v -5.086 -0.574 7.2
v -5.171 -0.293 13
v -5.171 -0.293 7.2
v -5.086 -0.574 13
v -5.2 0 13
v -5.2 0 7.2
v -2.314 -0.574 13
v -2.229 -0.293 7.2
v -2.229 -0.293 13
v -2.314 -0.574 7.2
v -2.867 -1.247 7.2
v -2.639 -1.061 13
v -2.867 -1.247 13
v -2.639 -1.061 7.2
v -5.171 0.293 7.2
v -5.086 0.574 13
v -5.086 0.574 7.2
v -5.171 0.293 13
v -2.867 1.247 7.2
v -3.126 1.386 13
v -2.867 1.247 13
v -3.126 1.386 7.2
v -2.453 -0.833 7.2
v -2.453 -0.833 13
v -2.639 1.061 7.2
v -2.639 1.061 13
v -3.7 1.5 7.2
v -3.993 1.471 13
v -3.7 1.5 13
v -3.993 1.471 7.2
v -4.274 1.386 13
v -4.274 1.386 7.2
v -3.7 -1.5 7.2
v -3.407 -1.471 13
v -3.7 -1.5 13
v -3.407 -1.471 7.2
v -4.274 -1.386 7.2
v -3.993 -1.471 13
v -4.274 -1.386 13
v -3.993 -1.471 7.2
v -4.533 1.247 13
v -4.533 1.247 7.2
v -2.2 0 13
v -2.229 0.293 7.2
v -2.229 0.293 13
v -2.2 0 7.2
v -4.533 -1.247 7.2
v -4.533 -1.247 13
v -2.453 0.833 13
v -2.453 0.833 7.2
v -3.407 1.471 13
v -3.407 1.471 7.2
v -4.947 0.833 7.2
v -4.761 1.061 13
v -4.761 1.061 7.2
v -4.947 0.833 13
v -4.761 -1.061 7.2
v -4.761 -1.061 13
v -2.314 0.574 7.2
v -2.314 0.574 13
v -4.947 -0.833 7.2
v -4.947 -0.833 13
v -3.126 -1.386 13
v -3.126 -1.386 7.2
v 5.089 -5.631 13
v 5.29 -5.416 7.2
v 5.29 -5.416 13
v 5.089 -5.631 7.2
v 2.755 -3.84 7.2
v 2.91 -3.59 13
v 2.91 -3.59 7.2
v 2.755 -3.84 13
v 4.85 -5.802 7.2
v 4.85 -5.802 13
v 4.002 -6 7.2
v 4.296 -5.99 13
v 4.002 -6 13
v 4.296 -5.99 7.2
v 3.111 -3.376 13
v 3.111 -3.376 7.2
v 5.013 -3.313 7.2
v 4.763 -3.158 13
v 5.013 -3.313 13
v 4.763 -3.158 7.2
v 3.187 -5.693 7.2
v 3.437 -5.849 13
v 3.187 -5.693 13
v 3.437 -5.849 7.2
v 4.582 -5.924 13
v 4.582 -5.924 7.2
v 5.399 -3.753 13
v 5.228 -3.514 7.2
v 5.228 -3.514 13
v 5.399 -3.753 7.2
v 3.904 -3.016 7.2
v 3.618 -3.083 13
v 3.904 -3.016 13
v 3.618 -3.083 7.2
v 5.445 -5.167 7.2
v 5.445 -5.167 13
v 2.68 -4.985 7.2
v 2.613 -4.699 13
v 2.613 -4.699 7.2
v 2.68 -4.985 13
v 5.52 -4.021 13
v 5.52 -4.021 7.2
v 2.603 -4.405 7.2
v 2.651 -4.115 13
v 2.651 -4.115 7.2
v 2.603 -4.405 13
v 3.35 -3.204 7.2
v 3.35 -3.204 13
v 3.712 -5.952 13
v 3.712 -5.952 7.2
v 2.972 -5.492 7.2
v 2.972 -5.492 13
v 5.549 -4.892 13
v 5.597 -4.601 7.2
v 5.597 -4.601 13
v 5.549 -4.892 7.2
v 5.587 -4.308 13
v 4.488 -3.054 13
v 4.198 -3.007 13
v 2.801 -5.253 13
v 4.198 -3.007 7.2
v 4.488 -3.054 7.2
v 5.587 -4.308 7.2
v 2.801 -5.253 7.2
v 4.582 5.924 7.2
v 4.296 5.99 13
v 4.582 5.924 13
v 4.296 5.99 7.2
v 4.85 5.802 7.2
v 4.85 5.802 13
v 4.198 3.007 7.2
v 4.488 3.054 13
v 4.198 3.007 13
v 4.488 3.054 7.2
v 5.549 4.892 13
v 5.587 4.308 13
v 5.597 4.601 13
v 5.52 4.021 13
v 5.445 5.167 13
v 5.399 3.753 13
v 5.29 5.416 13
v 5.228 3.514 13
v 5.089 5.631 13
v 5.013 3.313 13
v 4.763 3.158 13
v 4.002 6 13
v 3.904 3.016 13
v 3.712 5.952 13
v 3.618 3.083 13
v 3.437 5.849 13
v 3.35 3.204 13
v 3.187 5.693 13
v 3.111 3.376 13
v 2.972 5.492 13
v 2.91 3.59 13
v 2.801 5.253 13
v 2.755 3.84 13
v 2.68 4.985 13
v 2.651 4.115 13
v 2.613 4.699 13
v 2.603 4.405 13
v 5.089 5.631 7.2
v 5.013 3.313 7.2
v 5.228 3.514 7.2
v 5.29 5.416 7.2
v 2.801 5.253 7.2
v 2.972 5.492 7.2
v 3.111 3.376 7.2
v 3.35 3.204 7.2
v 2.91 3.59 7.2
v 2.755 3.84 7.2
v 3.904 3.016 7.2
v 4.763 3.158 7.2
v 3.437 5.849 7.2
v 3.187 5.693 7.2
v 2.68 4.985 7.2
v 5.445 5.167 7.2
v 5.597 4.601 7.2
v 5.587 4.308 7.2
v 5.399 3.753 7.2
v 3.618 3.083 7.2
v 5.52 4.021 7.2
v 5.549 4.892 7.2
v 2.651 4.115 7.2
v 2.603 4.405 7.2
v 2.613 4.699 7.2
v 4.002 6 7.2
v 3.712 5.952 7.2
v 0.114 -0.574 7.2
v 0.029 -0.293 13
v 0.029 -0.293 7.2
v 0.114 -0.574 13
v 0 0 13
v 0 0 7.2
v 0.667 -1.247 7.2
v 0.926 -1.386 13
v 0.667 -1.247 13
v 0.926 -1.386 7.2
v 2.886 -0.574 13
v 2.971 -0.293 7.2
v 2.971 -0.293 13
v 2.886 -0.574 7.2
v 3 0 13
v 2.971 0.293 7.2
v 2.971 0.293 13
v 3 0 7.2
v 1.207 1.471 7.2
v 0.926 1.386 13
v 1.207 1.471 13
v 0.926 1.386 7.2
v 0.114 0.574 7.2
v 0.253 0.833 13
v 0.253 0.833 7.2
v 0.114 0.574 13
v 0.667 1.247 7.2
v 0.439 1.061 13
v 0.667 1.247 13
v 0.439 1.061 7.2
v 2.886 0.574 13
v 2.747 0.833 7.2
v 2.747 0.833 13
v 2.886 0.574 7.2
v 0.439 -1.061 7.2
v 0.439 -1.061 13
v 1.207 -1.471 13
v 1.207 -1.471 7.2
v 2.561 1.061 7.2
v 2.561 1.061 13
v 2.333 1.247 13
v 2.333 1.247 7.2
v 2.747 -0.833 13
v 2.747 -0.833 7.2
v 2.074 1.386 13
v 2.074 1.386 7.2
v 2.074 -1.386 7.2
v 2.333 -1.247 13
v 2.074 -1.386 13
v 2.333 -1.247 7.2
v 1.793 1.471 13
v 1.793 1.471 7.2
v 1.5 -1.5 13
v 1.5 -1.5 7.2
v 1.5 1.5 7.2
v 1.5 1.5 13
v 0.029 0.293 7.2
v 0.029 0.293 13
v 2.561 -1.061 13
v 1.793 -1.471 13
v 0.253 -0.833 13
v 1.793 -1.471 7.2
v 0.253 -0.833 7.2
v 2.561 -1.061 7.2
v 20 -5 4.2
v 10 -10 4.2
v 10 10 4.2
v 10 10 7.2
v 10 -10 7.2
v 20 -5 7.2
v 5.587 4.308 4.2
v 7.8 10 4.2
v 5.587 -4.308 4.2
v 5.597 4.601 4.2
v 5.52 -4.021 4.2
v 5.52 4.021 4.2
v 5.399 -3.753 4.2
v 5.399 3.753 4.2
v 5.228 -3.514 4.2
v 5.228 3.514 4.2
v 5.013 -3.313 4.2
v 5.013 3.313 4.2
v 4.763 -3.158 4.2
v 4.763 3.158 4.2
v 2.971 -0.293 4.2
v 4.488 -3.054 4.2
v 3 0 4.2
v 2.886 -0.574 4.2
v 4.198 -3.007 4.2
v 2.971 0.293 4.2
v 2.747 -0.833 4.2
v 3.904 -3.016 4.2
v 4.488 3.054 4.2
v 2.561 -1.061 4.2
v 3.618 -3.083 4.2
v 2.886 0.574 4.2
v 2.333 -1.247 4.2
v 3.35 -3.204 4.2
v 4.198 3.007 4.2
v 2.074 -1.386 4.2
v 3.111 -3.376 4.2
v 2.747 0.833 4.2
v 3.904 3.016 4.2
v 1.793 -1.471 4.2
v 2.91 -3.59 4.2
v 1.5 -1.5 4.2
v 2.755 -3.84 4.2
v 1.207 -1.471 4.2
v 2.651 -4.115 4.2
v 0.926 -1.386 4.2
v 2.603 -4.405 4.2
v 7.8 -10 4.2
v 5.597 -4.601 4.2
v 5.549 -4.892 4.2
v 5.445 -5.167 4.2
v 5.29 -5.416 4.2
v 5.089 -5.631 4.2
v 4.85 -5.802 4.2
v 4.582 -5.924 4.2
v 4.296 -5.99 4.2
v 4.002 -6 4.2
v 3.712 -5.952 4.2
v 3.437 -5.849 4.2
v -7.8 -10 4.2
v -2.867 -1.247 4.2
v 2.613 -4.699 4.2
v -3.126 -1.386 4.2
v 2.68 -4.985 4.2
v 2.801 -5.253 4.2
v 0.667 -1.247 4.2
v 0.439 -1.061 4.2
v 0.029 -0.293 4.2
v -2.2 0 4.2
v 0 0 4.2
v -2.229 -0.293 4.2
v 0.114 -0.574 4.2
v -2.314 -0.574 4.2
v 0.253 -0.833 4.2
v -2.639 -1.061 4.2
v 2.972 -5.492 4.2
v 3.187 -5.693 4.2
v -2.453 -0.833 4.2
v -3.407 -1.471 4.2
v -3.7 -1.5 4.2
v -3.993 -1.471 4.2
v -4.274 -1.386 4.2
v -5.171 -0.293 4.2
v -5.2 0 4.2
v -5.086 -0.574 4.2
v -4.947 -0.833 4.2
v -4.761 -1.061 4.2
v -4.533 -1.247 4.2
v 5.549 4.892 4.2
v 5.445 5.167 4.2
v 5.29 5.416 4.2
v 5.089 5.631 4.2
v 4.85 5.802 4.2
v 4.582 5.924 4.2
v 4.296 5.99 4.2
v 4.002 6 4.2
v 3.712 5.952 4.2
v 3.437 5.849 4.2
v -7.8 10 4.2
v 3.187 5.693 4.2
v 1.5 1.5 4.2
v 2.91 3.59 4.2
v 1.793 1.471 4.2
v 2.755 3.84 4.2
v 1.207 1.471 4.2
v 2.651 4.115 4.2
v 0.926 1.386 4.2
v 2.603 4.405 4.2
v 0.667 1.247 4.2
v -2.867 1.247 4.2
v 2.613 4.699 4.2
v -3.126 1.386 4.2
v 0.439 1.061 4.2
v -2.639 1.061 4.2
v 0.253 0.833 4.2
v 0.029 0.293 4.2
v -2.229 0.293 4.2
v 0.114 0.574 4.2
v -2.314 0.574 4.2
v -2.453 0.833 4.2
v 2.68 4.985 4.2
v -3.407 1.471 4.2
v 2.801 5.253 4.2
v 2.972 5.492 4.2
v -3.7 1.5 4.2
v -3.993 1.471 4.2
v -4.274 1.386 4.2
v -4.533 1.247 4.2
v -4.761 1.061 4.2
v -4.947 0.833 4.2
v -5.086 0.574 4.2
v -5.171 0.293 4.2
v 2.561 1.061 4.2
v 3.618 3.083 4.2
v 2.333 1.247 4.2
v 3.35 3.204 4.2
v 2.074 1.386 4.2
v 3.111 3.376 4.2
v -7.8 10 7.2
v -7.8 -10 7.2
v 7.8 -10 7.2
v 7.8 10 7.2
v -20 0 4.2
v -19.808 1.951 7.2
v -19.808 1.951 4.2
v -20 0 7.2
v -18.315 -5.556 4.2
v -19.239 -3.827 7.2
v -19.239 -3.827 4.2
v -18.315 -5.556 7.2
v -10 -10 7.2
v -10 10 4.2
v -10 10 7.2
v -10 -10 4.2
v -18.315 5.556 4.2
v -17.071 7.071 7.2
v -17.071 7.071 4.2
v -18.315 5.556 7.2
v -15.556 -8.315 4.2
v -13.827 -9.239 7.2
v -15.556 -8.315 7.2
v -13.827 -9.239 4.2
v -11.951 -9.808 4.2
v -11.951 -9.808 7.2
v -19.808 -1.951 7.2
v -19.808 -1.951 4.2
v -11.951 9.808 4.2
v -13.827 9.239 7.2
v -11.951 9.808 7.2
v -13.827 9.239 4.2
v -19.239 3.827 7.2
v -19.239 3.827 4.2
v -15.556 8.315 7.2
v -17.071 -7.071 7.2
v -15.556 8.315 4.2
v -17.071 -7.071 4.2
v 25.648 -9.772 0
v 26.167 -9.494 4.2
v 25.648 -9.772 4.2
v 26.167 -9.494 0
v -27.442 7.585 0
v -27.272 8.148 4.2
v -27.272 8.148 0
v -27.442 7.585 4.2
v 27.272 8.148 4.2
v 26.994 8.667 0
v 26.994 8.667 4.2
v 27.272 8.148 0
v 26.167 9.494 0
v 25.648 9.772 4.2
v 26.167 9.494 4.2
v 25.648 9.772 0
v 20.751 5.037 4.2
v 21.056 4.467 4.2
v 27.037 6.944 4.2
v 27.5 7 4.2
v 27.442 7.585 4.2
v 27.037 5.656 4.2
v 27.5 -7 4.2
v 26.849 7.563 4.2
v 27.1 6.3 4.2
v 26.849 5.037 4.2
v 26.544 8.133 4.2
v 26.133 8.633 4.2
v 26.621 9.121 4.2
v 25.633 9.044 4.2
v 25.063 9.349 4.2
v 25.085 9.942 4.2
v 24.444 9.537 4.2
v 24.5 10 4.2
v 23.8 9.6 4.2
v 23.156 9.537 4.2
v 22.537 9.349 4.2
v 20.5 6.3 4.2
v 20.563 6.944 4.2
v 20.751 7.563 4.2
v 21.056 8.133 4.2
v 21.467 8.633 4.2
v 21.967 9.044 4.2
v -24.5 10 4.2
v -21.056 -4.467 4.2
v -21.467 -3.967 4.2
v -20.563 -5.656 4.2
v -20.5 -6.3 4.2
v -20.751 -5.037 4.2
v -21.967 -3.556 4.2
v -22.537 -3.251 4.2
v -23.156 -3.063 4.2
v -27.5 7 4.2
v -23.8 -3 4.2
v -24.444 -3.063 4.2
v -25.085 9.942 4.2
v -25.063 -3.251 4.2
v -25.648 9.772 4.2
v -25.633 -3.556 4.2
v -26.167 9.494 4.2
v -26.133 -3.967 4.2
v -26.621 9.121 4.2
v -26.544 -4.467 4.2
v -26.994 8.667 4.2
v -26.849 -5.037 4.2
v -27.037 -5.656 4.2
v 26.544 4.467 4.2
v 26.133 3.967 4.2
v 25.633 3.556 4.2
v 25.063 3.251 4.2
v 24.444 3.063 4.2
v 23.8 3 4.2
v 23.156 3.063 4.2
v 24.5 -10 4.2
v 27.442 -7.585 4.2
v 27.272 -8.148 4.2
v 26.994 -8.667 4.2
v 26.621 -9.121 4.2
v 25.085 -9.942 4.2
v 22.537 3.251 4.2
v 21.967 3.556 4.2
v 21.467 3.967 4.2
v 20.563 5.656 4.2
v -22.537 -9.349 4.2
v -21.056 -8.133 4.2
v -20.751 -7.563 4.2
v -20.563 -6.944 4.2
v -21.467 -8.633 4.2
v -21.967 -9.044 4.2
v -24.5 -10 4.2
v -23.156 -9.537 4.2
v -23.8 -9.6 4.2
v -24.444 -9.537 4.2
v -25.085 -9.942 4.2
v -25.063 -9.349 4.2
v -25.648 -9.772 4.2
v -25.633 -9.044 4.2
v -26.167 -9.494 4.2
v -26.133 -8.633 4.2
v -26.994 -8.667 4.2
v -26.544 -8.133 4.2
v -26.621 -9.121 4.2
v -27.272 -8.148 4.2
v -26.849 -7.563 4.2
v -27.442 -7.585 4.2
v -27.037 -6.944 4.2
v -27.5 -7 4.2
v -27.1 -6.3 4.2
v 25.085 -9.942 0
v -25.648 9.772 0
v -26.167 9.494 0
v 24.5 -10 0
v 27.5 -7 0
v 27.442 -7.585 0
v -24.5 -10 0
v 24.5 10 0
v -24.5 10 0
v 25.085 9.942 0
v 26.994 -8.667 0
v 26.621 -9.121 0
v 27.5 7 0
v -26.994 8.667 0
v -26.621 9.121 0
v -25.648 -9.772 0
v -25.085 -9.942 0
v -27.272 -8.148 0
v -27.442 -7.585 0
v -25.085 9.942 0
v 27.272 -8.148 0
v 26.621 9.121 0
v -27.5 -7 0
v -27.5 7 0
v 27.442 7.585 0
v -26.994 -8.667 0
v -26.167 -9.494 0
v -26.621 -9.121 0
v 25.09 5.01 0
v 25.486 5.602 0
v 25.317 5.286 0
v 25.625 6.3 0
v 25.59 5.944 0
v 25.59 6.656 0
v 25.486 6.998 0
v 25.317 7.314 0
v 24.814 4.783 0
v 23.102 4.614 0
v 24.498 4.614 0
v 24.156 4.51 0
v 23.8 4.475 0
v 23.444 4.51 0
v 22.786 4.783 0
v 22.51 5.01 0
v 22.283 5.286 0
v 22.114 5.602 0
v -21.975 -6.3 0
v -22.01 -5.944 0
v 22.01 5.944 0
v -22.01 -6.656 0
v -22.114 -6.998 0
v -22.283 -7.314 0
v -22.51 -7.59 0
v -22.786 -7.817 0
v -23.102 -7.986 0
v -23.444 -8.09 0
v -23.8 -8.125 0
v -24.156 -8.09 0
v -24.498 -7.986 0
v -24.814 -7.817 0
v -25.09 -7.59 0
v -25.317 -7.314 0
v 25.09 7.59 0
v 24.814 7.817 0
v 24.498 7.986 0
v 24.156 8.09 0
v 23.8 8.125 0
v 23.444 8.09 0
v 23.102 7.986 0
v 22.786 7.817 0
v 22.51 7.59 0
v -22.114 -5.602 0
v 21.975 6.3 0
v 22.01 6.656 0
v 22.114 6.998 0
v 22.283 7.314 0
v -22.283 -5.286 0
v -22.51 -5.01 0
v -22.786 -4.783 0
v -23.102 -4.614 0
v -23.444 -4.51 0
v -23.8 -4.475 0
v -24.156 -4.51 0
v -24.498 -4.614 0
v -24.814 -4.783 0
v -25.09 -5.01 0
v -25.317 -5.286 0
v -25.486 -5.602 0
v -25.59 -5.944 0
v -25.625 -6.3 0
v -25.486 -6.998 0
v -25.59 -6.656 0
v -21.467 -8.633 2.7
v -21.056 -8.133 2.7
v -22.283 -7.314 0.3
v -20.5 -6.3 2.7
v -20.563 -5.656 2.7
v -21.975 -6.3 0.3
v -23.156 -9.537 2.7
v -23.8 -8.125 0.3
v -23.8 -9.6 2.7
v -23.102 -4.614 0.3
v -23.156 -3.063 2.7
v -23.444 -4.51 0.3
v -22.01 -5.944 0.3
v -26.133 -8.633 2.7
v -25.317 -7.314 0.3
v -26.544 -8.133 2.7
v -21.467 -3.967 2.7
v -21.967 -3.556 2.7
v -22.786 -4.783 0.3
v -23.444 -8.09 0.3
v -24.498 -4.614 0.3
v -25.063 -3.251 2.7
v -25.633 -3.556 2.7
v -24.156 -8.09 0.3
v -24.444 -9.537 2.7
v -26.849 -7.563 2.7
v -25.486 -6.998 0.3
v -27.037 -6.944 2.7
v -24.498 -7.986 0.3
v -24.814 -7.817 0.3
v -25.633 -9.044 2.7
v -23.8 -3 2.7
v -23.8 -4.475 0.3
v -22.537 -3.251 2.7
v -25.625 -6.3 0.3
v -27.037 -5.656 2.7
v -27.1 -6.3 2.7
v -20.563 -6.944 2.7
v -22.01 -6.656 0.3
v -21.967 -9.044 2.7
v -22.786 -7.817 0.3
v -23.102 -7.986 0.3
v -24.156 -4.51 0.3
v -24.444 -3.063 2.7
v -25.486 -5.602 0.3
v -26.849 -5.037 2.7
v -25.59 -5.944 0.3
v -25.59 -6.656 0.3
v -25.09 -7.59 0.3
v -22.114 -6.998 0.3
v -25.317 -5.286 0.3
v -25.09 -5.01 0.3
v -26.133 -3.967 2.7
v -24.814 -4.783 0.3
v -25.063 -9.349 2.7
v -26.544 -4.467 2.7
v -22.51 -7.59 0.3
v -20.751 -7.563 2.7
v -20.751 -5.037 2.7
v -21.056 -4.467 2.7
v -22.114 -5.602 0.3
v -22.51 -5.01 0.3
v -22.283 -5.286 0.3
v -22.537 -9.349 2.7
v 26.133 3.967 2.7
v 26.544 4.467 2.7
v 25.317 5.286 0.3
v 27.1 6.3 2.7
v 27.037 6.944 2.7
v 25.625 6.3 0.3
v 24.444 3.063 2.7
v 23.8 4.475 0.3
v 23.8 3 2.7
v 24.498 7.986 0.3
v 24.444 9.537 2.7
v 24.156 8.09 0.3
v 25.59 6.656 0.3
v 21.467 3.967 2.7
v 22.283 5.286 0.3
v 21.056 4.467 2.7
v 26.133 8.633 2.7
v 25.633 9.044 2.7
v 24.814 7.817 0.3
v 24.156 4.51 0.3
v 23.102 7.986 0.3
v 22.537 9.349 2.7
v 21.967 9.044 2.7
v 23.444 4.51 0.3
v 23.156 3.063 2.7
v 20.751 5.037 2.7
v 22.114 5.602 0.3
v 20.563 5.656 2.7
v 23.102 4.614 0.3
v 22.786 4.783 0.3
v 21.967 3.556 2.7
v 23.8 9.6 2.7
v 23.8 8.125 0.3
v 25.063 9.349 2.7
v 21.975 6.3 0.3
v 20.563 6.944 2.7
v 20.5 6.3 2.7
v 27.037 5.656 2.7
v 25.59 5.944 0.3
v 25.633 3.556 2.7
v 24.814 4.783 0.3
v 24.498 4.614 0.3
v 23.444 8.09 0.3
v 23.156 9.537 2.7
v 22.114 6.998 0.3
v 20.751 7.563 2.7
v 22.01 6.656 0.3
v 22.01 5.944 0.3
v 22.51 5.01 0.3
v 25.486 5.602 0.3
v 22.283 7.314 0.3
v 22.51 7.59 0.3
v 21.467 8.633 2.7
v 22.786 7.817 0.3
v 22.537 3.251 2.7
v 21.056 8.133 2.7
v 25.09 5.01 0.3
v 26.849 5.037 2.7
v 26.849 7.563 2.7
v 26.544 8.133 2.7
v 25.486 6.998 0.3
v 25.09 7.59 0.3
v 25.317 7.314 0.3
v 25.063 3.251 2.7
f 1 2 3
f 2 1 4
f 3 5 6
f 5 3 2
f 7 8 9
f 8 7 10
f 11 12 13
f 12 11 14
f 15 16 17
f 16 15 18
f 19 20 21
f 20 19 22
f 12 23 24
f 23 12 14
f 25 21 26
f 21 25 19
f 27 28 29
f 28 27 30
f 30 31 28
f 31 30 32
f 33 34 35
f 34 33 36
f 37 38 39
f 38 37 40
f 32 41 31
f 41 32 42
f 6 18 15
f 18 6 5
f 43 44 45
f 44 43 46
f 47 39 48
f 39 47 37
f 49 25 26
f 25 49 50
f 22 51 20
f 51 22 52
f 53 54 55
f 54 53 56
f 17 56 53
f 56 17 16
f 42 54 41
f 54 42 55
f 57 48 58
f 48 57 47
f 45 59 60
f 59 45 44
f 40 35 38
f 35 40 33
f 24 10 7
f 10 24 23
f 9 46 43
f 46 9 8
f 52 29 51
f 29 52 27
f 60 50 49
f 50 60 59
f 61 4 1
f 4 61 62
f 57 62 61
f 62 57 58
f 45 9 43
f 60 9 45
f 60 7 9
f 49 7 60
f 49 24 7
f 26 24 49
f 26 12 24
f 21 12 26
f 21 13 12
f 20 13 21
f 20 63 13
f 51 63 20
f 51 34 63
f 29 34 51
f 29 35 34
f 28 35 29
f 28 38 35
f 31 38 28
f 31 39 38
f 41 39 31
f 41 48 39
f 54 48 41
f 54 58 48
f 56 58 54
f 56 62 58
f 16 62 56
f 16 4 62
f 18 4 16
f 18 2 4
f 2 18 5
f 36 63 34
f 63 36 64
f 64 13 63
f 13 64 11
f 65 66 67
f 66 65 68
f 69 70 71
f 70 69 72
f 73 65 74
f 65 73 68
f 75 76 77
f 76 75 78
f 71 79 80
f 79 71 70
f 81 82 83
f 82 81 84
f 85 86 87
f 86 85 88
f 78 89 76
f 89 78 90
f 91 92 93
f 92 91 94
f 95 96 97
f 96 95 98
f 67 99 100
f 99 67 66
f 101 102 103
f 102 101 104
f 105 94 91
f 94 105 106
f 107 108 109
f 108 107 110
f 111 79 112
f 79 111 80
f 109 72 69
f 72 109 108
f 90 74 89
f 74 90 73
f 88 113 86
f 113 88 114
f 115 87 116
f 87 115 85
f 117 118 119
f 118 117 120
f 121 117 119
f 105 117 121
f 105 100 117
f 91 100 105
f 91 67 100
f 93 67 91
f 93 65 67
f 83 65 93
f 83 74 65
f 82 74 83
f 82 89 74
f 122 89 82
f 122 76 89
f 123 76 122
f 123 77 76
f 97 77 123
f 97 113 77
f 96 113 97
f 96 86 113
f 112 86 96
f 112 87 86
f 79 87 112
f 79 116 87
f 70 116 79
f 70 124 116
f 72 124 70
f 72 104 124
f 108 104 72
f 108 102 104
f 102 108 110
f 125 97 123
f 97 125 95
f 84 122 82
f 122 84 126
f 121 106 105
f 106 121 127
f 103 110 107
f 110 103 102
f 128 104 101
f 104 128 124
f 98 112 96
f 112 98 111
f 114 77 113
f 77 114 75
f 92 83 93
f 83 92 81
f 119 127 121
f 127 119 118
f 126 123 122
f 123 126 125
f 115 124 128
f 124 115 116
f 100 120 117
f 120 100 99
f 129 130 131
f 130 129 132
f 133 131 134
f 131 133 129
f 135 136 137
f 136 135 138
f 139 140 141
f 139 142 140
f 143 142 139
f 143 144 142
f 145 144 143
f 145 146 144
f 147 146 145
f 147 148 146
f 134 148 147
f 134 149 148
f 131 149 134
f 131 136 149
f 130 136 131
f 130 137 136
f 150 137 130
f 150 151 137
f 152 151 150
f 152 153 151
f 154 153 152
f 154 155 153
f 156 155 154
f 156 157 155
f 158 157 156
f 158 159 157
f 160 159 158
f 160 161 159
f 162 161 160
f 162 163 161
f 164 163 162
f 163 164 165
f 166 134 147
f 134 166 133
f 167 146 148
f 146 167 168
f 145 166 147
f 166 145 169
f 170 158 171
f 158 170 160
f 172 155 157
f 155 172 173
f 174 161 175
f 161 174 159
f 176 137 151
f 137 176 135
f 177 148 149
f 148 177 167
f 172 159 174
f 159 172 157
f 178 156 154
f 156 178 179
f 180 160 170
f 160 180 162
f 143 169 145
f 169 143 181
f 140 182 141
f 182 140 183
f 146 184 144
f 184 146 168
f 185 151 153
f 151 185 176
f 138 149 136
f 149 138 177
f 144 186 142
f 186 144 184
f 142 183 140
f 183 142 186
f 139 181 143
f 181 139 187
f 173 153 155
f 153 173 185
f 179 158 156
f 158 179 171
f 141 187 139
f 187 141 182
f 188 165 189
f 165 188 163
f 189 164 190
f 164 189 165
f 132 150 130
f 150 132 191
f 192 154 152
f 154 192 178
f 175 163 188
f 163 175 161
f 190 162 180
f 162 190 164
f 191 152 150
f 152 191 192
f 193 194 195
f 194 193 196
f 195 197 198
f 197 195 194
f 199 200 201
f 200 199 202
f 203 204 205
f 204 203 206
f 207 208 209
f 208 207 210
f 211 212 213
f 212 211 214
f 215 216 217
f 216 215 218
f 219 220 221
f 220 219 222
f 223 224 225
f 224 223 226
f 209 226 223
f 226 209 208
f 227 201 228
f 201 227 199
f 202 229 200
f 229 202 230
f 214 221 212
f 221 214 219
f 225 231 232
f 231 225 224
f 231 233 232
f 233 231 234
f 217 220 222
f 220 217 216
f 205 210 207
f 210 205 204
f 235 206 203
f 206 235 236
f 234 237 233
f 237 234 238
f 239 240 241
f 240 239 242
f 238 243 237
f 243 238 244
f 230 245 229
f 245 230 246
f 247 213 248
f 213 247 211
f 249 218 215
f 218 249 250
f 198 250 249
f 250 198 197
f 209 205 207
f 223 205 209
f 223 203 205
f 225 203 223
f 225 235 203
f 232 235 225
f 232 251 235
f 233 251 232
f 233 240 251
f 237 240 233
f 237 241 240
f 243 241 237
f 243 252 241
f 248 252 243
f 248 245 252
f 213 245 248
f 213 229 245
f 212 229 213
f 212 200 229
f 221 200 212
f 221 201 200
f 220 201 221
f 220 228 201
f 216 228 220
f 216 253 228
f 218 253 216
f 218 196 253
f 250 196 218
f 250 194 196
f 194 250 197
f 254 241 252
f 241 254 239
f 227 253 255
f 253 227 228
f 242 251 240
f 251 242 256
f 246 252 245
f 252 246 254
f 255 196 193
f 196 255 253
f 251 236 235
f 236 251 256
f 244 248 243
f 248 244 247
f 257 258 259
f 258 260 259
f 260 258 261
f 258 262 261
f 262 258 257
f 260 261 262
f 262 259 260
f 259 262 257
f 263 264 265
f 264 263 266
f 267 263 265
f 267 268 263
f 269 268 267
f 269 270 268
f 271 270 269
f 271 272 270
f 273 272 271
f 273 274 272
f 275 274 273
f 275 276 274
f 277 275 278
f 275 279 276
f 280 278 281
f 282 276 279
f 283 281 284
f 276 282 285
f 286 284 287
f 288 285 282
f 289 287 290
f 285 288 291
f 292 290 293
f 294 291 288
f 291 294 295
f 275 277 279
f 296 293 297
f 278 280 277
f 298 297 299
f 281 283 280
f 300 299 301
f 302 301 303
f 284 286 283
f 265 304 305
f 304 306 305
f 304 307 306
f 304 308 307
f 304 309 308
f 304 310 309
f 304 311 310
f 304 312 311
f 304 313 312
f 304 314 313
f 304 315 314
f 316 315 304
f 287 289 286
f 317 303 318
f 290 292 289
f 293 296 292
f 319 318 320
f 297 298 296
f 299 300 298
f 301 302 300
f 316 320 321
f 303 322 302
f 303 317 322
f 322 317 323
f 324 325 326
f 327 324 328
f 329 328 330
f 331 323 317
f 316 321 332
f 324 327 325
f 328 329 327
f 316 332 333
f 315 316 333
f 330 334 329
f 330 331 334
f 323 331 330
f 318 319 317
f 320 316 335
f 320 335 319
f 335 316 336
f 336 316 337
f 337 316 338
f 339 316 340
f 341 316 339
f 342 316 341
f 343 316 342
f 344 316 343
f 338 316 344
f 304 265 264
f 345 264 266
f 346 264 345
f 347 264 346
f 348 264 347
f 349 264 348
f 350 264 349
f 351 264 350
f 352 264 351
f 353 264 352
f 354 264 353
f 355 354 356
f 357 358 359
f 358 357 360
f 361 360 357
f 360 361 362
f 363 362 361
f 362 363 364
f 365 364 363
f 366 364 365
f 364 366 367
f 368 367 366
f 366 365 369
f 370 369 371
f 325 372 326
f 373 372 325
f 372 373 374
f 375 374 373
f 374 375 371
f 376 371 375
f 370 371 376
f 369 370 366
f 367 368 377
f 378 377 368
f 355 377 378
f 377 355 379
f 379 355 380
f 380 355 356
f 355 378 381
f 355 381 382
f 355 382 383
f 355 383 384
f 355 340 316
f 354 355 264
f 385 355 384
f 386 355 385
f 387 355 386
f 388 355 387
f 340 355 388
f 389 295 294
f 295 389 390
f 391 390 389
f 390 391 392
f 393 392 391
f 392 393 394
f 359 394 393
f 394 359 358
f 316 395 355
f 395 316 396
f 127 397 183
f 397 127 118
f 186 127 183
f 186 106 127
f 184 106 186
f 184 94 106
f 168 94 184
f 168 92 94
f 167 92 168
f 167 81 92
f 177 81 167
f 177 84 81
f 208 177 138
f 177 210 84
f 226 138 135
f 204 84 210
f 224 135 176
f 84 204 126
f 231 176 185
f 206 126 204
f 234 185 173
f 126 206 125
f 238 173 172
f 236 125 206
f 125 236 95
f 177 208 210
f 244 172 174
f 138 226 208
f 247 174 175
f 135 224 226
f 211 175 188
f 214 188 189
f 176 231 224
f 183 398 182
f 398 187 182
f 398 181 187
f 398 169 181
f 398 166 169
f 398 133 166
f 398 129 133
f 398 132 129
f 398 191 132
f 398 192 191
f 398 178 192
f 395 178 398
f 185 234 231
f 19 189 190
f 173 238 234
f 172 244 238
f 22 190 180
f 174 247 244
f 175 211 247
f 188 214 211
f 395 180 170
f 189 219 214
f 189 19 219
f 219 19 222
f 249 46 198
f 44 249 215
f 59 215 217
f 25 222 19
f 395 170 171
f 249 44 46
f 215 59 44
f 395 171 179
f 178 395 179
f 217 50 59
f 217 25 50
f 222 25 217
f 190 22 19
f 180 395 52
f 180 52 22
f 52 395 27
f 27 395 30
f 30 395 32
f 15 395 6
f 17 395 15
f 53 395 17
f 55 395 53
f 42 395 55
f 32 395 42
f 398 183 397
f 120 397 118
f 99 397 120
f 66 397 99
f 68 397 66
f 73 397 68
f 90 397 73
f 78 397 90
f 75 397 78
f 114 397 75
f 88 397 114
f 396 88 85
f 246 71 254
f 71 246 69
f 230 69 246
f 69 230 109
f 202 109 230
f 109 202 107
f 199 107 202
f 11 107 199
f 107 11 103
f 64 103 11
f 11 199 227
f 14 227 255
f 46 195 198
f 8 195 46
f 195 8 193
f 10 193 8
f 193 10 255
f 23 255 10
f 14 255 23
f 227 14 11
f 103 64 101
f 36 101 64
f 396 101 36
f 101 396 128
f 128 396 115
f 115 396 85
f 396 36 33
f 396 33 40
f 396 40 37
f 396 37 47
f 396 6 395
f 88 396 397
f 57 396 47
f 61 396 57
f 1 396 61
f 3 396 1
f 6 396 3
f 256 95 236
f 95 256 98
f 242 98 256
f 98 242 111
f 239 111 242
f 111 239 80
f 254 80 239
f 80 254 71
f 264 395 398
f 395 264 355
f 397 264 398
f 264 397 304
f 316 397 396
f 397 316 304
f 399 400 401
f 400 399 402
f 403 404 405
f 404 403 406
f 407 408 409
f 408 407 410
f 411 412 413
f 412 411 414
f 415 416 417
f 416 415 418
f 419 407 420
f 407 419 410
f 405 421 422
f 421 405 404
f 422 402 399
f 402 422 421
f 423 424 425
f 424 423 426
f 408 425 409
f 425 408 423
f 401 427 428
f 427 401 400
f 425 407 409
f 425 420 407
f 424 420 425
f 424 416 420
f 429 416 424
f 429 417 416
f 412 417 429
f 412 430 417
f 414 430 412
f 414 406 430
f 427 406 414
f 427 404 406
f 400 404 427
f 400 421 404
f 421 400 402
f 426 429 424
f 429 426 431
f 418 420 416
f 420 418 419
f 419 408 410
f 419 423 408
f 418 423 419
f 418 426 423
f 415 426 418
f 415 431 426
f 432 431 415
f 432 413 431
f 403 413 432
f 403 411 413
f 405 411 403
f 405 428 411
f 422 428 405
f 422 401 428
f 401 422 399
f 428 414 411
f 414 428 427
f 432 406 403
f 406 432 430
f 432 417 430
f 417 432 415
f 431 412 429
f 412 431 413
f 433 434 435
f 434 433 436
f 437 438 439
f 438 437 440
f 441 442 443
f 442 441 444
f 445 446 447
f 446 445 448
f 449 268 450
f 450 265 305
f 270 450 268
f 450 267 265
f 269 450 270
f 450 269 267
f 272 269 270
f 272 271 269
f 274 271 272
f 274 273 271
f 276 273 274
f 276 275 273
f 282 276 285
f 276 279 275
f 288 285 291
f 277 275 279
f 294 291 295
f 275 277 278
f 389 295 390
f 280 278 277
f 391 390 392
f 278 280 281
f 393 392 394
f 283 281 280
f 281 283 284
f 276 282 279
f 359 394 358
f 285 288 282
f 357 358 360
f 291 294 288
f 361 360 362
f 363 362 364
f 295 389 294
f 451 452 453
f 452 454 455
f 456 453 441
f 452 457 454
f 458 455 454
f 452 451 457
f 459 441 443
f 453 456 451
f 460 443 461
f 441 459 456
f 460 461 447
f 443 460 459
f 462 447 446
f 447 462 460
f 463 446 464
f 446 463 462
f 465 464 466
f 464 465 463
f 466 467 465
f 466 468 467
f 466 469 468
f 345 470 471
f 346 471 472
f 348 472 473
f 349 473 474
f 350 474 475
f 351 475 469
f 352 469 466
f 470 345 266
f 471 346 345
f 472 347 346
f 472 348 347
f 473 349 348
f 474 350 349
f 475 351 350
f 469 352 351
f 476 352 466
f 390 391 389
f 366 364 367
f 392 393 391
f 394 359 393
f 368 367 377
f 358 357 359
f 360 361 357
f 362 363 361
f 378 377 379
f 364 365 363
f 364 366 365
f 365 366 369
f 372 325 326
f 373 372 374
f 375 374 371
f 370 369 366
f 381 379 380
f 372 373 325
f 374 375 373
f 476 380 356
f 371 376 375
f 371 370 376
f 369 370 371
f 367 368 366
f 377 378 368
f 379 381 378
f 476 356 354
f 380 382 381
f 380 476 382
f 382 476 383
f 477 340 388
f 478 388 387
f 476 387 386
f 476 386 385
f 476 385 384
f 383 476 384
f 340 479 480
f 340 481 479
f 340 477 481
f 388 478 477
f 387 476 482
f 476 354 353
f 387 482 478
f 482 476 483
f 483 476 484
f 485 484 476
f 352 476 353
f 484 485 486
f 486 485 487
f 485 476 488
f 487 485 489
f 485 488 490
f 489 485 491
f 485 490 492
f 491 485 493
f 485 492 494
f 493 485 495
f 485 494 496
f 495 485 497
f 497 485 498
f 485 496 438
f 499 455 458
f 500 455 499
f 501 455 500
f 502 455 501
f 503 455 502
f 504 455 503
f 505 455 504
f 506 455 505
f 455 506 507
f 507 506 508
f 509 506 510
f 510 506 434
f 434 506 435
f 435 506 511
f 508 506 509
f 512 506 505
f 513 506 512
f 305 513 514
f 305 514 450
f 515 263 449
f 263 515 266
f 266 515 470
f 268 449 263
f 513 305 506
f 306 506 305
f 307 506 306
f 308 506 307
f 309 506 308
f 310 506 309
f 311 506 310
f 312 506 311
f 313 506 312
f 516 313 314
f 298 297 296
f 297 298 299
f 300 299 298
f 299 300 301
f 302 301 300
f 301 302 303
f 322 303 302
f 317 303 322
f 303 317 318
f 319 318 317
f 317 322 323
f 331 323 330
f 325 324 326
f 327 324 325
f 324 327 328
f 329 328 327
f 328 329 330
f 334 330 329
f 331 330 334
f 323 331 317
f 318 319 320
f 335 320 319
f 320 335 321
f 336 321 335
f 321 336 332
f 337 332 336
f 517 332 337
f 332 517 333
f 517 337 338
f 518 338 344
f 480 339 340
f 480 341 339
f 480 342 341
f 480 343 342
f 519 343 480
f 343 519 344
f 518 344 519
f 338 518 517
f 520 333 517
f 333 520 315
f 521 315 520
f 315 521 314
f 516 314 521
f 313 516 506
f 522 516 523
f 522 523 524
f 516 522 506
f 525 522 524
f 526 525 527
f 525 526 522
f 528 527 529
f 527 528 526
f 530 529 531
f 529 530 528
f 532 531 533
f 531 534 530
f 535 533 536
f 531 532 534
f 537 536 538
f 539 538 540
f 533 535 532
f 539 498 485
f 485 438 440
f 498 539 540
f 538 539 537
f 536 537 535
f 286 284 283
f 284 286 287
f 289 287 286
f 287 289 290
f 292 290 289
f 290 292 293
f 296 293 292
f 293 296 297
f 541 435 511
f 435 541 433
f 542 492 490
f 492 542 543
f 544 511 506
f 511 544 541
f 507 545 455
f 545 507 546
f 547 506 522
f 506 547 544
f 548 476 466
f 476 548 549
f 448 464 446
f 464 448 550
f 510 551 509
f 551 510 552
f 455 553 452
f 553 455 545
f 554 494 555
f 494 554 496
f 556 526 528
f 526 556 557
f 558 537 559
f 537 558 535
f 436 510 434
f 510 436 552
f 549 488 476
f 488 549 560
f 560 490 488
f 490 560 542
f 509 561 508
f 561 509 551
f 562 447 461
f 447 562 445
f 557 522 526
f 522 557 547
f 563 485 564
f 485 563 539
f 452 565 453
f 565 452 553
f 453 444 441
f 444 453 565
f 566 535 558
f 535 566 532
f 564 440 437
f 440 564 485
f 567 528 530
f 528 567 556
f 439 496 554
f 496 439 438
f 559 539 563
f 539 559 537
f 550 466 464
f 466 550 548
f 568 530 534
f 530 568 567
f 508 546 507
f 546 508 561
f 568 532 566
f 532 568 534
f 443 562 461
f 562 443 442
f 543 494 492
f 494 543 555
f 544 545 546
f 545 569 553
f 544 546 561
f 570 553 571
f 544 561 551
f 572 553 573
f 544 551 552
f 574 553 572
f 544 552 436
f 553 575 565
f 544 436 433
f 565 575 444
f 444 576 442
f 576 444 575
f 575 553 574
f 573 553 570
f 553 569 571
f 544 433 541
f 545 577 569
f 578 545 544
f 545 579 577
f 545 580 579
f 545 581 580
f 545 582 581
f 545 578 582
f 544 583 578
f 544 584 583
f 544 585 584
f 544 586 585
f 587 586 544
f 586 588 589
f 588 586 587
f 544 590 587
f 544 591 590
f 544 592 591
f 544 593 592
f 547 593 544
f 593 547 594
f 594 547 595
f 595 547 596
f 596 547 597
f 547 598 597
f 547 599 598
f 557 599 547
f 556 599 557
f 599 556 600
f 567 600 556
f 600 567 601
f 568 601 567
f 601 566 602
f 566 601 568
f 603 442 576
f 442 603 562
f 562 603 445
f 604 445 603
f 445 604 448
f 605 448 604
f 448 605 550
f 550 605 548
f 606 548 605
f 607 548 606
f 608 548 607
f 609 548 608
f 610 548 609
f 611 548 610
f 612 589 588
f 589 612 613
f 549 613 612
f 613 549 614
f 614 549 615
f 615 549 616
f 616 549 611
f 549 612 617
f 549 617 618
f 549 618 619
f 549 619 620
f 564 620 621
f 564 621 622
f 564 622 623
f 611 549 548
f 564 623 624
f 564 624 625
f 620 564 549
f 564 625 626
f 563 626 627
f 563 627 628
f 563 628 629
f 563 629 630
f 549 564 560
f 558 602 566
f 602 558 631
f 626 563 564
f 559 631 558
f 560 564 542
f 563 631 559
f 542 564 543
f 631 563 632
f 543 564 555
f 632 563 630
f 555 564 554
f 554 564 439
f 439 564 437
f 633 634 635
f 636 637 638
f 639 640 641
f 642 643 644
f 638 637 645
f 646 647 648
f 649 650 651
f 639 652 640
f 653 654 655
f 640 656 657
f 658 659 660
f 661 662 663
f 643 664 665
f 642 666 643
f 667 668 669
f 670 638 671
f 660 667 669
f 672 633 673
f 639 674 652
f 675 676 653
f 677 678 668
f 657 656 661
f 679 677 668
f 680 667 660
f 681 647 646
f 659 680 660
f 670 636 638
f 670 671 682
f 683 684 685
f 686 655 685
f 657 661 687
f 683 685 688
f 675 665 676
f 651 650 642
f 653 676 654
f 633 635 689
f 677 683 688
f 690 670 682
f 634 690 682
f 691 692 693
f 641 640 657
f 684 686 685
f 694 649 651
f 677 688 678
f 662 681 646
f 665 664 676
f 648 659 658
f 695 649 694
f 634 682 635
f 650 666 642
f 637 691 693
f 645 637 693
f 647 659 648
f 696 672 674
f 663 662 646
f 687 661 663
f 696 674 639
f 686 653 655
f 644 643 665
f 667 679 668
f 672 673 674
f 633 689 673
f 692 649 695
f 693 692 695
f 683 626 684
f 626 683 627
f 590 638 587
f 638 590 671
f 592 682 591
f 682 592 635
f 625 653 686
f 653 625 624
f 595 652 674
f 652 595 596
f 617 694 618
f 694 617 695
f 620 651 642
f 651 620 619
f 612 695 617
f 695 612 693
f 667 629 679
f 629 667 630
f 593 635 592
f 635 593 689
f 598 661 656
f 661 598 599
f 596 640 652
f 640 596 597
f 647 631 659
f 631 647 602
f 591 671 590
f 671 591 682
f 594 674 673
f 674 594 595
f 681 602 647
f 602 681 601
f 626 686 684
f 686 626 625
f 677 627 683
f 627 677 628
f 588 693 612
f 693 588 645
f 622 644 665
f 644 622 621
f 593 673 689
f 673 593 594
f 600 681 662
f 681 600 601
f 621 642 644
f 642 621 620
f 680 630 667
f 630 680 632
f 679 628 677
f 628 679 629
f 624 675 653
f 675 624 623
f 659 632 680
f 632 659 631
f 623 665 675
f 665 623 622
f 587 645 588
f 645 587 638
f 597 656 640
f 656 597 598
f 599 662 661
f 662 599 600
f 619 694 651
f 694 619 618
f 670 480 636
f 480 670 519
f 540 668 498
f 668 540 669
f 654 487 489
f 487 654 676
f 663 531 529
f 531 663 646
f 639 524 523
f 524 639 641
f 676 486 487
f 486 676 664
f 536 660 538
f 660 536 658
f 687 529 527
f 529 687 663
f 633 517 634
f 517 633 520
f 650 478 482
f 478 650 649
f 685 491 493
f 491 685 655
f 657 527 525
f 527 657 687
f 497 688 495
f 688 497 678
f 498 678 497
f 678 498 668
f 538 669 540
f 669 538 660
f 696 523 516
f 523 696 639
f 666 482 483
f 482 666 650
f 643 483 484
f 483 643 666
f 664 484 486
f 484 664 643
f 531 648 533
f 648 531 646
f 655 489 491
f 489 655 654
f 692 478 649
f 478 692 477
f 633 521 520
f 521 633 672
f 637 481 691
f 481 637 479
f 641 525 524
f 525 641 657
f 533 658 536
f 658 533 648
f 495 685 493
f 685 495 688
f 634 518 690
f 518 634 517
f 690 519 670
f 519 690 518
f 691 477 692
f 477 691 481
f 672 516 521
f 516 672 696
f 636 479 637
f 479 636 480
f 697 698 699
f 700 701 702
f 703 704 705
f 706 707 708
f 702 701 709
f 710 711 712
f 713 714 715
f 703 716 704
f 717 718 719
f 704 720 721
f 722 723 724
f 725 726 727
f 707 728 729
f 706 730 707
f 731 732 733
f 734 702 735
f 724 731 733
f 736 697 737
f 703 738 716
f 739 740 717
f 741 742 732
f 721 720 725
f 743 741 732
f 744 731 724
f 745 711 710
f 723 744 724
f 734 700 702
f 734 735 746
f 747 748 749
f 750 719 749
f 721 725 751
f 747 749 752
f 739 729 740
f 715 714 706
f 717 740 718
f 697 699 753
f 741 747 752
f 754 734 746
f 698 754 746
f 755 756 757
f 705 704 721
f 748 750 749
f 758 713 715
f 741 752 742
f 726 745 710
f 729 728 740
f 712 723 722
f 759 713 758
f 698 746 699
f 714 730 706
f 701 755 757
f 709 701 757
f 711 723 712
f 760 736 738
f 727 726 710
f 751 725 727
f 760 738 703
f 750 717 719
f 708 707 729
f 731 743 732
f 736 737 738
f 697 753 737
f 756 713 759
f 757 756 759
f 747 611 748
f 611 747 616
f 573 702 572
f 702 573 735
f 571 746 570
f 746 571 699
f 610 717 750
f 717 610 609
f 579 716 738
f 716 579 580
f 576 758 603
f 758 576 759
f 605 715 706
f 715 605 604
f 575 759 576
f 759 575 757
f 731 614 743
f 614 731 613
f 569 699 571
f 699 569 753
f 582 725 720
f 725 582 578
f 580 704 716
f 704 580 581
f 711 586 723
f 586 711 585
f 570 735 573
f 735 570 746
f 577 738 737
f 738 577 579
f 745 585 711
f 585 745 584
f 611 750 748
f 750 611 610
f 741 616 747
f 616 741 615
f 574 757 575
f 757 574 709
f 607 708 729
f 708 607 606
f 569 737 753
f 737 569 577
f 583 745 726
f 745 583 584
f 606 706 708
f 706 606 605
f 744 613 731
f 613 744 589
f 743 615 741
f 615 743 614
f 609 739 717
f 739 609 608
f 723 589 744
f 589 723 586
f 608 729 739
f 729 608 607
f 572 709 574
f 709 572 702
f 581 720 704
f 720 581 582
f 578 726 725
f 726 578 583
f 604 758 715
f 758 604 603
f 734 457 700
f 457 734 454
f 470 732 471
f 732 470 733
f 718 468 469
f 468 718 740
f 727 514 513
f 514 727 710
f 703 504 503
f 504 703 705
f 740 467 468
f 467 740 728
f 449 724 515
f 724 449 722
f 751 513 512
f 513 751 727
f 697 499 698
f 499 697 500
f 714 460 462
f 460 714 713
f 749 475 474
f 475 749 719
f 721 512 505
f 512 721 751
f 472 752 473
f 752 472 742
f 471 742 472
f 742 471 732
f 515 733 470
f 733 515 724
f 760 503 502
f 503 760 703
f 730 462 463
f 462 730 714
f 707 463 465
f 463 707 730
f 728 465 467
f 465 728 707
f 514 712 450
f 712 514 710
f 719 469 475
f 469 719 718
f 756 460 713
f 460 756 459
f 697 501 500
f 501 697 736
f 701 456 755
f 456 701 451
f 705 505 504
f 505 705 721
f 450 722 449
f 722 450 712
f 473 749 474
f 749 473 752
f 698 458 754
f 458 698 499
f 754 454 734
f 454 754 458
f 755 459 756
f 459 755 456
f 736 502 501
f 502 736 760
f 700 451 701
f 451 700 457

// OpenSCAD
// bender block
$fn = 32;

wire_dia = 2.2; // With insulation

block_len = 55.0;
block_wid = 20.0;
block_h = 4.2;
block_rounding = 3.0;
end_space = 5.0;

// Dimensions for top bending geometry
bender_h = 3.0; // A little thicker than the wire diameter
triangle_ratio = 4;

bender_stick_h = bender_h*2; // Above block
bender_stick_padding = 1.0;
bender_stick_dia = 3.0;
num_bender_sticks = 3; // Around the center one
bender_stick_x_offset = -1.5;

mount_screw_shaft_dia = 3.65;
mount_screw_shaft_len = 15.6;
mount_screw_head_dia = 6.6;
mount_screw_head_len = 2.4;
mount_screw_head_top_h = 1.5;

module mount_screw() {
    translate([0,0,-mount_screw_head_len])
    linear_extrude(mount_screw_head_len, scale = mount_screw_head_dia/mount_screw_shaft_dia)
    circle(d=mount_screw_shaft_dia);
    translate([0,0,-mount_screw_shaft_len-mount_screw_head_len])
    linear_extrude(mount_screw_shaft_len)
    circle(d=mount_screw_shaft_dia);
    linear_extrude(mount_screw_head_top_h)
    circle(d=mount_screw_head_dia);
}



module block_body() {
    linear_extrude(block_h)
    offset(block_rounding) offset(-block_rounding)
    square([block_len, block_wid], center=true);
}

module block_triangle() {
    translate([block_wid/2,-block_wid/2,0])
    linear_extrude(bender_h)
    polygon([
        [0,0],
        [0,block_wid],
        [block_wid/2,block_wid/triangle_ratio]
    ]);
}

module block_semicircle() {
    translate([-block_wid/2,0,0])
    linear_extrude(bender_h)
    difference() {
        circle(d=block_wid);
        translate([block_wid/2,0,0])
        square(block_wid, center=true);
    }
}

module block_mid_rects() {
    linear_extrude(bender_h)
    square([block_wid-wire_dia*2,block_wid], center=true);
}

module solid_block() {
    block_body();
    translate([0,0,block_h])
    color("#a52020", 1.0) {
        block_triangle();
        block_mid_rects();
        block_semicircle();
    }
}

module bender_stick(space=0.0) {
    linear_extrude(bender_stick_h*2)
    circle(d=bender_stick_dia-space);
}

module bender_stick_holes(spacing=0.0) {
    rotate([0,0,180])
    translate([bender_stick_x_offset,0,bender_stick_padding]) {
        bender_stick(spacing);
        for (i=[0:num_bender_sticks]) {
            rotate([0,0,i*(360/num_bender_sticks)])
            translate([bender_stick_dia+wire_dia,0,0])
            bender_stick(spacing);
        }
    }
}

mount_screw_edge_dist = 0.4;
module bender_block() {
    bender_stick_holes();
    difference() {
        solid_block();
        
        translate([0,0,block_h-mount_screw_head_top_h]) {
            translate([-block_len/2+mount_screw_head_dia/2+mount_screw_edge_dist,-block_wid/2+mount_screw_head_dia/2+mount_screw_edge_dist])
            mount_screw();
            translate([block_len/2-mount_screw_head_dia/2-mount_screw_edge_dist,block_wid/2-mount_screw_head_dia/2-mount_screw_edge_dist])
            mount_screw();
        }
    }
    
}
bender_block();
//translate([block_len/2+10,0,-bender_stick_padding])
//bender_stick_holes(spacing=0.1);
//bender_stick(0.1);
